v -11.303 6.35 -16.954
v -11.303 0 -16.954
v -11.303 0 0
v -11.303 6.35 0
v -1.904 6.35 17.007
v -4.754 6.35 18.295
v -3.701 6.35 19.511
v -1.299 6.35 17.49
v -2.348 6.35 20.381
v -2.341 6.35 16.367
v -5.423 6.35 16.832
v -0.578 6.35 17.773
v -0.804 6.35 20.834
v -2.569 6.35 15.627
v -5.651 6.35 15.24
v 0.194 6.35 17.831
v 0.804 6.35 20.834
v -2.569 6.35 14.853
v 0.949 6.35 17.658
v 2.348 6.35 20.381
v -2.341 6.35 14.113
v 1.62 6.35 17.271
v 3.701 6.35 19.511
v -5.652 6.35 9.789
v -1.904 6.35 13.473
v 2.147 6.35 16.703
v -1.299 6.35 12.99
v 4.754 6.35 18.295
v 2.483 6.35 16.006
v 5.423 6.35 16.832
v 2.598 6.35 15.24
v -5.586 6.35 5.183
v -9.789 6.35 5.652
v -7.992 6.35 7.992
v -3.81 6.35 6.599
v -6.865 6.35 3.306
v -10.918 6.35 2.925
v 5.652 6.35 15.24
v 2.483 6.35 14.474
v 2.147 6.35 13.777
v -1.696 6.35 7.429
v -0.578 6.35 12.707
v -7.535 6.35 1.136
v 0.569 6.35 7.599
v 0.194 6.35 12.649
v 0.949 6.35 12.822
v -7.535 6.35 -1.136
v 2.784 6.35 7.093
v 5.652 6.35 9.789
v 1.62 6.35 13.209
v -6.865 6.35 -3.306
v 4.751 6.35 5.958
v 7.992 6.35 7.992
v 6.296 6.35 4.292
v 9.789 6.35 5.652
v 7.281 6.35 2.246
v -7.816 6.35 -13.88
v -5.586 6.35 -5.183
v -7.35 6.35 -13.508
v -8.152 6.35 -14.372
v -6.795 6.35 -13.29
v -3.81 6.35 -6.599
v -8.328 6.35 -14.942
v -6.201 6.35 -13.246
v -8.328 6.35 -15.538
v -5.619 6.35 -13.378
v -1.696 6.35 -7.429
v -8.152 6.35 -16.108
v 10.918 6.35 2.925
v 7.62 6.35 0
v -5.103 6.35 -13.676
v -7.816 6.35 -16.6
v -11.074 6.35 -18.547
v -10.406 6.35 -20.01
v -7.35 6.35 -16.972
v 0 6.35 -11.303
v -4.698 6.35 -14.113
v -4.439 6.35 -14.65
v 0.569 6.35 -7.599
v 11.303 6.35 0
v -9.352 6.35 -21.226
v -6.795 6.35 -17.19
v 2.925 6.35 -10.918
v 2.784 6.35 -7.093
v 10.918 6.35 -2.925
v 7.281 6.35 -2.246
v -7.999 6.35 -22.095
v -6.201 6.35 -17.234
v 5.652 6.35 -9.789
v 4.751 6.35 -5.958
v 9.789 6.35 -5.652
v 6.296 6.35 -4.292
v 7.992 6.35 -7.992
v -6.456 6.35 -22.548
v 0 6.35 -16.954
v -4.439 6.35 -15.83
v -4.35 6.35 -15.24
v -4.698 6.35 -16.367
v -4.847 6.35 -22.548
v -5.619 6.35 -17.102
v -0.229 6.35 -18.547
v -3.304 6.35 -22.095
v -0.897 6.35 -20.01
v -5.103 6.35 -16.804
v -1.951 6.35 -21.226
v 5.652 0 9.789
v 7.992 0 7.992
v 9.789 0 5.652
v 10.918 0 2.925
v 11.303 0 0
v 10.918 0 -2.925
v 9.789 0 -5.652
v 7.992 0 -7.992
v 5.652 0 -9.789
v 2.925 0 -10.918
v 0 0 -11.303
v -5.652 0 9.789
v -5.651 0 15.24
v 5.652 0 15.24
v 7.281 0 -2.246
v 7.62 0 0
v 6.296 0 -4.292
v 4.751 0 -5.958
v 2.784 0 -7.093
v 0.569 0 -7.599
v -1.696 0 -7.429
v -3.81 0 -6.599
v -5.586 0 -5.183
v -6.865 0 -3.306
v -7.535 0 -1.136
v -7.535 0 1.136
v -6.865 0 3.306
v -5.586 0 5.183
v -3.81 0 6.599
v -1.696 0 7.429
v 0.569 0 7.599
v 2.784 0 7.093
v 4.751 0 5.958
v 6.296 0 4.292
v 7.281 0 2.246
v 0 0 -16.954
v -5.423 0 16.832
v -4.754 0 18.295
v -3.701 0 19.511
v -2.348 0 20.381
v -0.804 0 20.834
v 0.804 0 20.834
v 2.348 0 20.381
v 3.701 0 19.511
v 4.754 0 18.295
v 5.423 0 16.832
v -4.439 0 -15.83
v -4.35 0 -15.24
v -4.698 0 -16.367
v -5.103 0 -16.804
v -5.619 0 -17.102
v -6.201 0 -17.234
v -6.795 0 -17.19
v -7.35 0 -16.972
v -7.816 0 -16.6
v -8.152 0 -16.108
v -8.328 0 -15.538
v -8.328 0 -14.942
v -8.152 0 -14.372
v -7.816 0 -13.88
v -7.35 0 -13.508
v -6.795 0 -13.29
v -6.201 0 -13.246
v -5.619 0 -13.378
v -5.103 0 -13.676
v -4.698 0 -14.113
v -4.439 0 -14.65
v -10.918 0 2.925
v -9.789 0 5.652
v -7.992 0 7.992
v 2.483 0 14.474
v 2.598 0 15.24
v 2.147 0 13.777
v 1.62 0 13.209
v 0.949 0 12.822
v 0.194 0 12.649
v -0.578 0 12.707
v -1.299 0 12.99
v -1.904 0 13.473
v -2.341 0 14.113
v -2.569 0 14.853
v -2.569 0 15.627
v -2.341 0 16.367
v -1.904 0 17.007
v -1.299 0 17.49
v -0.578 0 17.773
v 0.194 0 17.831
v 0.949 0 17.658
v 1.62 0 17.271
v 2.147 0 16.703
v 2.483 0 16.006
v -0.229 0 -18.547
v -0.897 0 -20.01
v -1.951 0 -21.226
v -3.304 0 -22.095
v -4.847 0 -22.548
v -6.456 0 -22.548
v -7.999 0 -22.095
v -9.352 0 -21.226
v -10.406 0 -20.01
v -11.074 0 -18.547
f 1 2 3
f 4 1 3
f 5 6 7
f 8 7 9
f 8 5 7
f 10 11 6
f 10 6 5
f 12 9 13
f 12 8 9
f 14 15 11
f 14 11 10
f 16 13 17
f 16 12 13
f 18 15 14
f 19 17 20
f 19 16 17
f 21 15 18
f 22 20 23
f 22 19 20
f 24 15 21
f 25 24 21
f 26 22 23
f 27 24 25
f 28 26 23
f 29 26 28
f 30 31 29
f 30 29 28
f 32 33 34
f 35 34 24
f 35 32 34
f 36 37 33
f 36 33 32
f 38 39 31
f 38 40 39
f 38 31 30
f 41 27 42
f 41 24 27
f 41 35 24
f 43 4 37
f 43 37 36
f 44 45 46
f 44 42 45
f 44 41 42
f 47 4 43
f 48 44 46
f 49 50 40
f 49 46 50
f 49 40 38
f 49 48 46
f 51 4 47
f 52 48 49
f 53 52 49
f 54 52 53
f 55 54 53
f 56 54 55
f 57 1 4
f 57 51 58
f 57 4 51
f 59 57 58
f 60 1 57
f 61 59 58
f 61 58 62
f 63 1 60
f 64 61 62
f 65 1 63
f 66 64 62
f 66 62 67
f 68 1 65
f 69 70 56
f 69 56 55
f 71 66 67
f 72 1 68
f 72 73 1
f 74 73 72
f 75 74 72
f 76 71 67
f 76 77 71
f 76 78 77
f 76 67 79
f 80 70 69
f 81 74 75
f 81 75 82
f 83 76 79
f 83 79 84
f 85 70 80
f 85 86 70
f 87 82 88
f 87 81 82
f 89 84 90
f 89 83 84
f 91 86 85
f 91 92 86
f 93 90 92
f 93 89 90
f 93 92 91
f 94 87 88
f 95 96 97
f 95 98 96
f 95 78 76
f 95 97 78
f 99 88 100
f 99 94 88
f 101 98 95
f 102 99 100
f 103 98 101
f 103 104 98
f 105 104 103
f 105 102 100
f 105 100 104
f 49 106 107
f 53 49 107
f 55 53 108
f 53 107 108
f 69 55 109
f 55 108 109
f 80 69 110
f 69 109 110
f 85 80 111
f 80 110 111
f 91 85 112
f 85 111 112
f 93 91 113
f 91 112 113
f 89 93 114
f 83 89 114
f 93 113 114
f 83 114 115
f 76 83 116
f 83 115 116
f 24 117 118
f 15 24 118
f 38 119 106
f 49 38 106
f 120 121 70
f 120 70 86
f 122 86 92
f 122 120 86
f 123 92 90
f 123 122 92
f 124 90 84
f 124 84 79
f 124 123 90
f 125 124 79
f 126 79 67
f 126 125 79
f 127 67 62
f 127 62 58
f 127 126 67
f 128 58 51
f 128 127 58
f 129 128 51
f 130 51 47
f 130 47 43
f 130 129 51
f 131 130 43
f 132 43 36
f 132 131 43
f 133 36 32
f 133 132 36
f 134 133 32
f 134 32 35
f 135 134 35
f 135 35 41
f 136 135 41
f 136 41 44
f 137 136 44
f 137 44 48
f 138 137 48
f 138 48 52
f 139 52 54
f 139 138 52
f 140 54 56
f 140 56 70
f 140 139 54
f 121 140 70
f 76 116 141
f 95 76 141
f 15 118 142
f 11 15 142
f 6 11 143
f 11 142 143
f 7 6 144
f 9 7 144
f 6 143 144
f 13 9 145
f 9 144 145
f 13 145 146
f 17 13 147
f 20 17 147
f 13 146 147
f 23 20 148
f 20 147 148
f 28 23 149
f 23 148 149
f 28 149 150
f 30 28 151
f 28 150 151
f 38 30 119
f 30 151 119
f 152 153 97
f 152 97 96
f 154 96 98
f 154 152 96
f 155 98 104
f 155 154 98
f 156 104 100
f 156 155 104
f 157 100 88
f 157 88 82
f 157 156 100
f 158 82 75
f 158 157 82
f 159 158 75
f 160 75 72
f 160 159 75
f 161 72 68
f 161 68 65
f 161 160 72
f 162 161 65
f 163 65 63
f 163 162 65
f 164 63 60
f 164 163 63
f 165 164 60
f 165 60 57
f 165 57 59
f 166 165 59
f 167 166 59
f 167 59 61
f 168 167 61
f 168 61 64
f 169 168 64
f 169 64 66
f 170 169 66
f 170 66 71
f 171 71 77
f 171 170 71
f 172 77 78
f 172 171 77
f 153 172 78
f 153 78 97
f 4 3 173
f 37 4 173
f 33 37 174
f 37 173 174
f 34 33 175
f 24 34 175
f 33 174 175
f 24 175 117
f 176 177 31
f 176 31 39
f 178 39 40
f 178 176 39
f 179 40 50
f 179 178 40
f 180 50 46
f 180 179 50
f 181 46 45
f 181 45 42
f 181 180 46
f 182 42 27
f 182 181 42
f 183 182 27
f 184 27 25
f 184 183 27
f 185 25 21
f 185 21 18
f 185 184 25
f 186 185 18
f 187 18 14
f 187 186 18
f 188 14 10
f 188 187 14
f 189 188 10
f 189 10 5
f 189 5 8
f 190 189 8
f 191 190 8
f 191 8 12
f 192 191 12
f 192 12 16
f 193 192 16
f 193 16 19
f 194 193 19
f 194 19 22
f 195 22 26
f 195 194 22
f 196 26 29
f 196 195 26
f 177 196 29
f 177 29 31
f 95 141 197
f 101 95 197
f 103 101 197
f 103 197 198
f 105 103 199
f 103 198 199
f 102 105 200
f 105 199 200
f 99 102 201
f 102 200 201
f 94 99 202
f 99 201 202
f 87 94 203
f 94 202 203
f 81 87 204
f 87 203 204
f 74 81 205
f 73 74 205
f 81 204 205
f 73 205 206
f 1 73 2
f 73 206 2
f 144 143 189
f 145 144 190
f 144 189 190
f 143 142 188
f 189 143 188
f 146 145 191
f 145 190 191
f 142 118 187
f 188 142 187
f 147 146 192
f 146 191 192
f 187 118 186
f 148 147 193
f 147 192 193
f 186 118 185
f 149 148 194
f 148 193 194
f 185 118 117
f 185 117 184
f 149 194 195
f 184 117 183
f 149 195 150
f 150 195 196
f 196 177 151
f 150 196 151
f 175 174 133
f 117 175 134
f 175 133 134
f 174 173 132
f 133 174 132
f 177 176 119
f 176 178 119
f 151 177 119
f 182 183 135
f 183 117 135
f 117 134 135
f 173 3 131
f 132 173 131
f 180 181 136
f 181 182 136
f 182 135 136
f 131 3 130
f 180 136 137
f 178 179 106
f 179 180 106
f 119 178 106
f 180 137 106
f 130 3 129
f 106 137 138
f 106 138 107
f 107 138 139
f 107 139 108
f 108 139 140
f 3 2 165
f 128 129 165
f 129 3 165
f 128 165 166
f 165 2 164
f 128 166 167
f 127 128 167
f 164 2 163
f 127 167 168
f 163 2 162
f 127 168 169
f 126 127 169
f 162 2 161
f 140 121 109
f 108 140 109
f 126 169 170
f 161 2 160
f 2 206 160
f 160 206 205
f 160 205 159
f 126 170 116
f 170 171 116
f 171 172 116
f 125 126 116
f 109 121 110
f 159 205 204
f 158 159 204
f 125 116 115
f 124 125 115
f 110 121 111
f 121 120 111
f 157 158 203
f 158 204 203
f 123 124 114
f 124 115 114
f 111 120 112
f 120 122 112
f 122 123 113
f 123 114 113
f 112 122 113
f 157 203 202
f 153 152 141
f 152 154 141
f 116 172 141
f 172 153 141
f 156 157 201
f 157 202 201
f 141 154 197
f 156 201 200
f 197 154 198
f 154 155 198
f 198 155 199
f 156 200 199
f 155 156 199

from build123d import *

# Parameters (mm, degrees)
SKETCH1_R           = 7.62
SKETCH1_R_2         = 2
SKETCH1_R_3         = 2.597919061
BOSS_EXTRUDE1_DEPTH = 6.35


with BuildPart() as part:
    # Sketch1 → Boss-Extrude1 (new body)
    with BuildSketch(Plane(origin=(0, 0, 0), x_dir=(1, 0, 0), z_dir=(0, 1, 0))):
        with BuildLine():
            Line((-11.303, 16.9545), (-11.303, 0))
            ThreePointArc((-11.303, 0), (-9.788685139, -5.6515), (-5.6515, -9.788685139))
            Line((-5.6515, -9.788685139), (-5.6515, -15.24))
            ThreePointArc((-5.6515, -15.24), (0, -20.8915), (5.6515, -15.24))
            Line((5.6515, -15.24), (5.6515, -9.788685139))
            ThreePointArc((5.6515, -9.788685139), (10.917859615, 2.925431667), (0, 11.303))
            Line((0, 11.303), (0, 16.9545))
            ThreePointArc((0, 16.9545), (-5.6515, 22.606), (-11.303, 16.9545))
        make_face()
        Circle(SKETCH1_R, mode=Mode.SUBTRACT)
        with Locations((-6.35, 15.24)):
            Circle(SKETCH1_R_2, mode=Mode.SUBTRACT)
        with Locations((0, -15.24)):
            Circle(SKETCH1_R_3, mode=Mode.SUBTRACT)
    extrude(amount=BOSS_EXTRUDE1_DEPTH)


solid = part.part
